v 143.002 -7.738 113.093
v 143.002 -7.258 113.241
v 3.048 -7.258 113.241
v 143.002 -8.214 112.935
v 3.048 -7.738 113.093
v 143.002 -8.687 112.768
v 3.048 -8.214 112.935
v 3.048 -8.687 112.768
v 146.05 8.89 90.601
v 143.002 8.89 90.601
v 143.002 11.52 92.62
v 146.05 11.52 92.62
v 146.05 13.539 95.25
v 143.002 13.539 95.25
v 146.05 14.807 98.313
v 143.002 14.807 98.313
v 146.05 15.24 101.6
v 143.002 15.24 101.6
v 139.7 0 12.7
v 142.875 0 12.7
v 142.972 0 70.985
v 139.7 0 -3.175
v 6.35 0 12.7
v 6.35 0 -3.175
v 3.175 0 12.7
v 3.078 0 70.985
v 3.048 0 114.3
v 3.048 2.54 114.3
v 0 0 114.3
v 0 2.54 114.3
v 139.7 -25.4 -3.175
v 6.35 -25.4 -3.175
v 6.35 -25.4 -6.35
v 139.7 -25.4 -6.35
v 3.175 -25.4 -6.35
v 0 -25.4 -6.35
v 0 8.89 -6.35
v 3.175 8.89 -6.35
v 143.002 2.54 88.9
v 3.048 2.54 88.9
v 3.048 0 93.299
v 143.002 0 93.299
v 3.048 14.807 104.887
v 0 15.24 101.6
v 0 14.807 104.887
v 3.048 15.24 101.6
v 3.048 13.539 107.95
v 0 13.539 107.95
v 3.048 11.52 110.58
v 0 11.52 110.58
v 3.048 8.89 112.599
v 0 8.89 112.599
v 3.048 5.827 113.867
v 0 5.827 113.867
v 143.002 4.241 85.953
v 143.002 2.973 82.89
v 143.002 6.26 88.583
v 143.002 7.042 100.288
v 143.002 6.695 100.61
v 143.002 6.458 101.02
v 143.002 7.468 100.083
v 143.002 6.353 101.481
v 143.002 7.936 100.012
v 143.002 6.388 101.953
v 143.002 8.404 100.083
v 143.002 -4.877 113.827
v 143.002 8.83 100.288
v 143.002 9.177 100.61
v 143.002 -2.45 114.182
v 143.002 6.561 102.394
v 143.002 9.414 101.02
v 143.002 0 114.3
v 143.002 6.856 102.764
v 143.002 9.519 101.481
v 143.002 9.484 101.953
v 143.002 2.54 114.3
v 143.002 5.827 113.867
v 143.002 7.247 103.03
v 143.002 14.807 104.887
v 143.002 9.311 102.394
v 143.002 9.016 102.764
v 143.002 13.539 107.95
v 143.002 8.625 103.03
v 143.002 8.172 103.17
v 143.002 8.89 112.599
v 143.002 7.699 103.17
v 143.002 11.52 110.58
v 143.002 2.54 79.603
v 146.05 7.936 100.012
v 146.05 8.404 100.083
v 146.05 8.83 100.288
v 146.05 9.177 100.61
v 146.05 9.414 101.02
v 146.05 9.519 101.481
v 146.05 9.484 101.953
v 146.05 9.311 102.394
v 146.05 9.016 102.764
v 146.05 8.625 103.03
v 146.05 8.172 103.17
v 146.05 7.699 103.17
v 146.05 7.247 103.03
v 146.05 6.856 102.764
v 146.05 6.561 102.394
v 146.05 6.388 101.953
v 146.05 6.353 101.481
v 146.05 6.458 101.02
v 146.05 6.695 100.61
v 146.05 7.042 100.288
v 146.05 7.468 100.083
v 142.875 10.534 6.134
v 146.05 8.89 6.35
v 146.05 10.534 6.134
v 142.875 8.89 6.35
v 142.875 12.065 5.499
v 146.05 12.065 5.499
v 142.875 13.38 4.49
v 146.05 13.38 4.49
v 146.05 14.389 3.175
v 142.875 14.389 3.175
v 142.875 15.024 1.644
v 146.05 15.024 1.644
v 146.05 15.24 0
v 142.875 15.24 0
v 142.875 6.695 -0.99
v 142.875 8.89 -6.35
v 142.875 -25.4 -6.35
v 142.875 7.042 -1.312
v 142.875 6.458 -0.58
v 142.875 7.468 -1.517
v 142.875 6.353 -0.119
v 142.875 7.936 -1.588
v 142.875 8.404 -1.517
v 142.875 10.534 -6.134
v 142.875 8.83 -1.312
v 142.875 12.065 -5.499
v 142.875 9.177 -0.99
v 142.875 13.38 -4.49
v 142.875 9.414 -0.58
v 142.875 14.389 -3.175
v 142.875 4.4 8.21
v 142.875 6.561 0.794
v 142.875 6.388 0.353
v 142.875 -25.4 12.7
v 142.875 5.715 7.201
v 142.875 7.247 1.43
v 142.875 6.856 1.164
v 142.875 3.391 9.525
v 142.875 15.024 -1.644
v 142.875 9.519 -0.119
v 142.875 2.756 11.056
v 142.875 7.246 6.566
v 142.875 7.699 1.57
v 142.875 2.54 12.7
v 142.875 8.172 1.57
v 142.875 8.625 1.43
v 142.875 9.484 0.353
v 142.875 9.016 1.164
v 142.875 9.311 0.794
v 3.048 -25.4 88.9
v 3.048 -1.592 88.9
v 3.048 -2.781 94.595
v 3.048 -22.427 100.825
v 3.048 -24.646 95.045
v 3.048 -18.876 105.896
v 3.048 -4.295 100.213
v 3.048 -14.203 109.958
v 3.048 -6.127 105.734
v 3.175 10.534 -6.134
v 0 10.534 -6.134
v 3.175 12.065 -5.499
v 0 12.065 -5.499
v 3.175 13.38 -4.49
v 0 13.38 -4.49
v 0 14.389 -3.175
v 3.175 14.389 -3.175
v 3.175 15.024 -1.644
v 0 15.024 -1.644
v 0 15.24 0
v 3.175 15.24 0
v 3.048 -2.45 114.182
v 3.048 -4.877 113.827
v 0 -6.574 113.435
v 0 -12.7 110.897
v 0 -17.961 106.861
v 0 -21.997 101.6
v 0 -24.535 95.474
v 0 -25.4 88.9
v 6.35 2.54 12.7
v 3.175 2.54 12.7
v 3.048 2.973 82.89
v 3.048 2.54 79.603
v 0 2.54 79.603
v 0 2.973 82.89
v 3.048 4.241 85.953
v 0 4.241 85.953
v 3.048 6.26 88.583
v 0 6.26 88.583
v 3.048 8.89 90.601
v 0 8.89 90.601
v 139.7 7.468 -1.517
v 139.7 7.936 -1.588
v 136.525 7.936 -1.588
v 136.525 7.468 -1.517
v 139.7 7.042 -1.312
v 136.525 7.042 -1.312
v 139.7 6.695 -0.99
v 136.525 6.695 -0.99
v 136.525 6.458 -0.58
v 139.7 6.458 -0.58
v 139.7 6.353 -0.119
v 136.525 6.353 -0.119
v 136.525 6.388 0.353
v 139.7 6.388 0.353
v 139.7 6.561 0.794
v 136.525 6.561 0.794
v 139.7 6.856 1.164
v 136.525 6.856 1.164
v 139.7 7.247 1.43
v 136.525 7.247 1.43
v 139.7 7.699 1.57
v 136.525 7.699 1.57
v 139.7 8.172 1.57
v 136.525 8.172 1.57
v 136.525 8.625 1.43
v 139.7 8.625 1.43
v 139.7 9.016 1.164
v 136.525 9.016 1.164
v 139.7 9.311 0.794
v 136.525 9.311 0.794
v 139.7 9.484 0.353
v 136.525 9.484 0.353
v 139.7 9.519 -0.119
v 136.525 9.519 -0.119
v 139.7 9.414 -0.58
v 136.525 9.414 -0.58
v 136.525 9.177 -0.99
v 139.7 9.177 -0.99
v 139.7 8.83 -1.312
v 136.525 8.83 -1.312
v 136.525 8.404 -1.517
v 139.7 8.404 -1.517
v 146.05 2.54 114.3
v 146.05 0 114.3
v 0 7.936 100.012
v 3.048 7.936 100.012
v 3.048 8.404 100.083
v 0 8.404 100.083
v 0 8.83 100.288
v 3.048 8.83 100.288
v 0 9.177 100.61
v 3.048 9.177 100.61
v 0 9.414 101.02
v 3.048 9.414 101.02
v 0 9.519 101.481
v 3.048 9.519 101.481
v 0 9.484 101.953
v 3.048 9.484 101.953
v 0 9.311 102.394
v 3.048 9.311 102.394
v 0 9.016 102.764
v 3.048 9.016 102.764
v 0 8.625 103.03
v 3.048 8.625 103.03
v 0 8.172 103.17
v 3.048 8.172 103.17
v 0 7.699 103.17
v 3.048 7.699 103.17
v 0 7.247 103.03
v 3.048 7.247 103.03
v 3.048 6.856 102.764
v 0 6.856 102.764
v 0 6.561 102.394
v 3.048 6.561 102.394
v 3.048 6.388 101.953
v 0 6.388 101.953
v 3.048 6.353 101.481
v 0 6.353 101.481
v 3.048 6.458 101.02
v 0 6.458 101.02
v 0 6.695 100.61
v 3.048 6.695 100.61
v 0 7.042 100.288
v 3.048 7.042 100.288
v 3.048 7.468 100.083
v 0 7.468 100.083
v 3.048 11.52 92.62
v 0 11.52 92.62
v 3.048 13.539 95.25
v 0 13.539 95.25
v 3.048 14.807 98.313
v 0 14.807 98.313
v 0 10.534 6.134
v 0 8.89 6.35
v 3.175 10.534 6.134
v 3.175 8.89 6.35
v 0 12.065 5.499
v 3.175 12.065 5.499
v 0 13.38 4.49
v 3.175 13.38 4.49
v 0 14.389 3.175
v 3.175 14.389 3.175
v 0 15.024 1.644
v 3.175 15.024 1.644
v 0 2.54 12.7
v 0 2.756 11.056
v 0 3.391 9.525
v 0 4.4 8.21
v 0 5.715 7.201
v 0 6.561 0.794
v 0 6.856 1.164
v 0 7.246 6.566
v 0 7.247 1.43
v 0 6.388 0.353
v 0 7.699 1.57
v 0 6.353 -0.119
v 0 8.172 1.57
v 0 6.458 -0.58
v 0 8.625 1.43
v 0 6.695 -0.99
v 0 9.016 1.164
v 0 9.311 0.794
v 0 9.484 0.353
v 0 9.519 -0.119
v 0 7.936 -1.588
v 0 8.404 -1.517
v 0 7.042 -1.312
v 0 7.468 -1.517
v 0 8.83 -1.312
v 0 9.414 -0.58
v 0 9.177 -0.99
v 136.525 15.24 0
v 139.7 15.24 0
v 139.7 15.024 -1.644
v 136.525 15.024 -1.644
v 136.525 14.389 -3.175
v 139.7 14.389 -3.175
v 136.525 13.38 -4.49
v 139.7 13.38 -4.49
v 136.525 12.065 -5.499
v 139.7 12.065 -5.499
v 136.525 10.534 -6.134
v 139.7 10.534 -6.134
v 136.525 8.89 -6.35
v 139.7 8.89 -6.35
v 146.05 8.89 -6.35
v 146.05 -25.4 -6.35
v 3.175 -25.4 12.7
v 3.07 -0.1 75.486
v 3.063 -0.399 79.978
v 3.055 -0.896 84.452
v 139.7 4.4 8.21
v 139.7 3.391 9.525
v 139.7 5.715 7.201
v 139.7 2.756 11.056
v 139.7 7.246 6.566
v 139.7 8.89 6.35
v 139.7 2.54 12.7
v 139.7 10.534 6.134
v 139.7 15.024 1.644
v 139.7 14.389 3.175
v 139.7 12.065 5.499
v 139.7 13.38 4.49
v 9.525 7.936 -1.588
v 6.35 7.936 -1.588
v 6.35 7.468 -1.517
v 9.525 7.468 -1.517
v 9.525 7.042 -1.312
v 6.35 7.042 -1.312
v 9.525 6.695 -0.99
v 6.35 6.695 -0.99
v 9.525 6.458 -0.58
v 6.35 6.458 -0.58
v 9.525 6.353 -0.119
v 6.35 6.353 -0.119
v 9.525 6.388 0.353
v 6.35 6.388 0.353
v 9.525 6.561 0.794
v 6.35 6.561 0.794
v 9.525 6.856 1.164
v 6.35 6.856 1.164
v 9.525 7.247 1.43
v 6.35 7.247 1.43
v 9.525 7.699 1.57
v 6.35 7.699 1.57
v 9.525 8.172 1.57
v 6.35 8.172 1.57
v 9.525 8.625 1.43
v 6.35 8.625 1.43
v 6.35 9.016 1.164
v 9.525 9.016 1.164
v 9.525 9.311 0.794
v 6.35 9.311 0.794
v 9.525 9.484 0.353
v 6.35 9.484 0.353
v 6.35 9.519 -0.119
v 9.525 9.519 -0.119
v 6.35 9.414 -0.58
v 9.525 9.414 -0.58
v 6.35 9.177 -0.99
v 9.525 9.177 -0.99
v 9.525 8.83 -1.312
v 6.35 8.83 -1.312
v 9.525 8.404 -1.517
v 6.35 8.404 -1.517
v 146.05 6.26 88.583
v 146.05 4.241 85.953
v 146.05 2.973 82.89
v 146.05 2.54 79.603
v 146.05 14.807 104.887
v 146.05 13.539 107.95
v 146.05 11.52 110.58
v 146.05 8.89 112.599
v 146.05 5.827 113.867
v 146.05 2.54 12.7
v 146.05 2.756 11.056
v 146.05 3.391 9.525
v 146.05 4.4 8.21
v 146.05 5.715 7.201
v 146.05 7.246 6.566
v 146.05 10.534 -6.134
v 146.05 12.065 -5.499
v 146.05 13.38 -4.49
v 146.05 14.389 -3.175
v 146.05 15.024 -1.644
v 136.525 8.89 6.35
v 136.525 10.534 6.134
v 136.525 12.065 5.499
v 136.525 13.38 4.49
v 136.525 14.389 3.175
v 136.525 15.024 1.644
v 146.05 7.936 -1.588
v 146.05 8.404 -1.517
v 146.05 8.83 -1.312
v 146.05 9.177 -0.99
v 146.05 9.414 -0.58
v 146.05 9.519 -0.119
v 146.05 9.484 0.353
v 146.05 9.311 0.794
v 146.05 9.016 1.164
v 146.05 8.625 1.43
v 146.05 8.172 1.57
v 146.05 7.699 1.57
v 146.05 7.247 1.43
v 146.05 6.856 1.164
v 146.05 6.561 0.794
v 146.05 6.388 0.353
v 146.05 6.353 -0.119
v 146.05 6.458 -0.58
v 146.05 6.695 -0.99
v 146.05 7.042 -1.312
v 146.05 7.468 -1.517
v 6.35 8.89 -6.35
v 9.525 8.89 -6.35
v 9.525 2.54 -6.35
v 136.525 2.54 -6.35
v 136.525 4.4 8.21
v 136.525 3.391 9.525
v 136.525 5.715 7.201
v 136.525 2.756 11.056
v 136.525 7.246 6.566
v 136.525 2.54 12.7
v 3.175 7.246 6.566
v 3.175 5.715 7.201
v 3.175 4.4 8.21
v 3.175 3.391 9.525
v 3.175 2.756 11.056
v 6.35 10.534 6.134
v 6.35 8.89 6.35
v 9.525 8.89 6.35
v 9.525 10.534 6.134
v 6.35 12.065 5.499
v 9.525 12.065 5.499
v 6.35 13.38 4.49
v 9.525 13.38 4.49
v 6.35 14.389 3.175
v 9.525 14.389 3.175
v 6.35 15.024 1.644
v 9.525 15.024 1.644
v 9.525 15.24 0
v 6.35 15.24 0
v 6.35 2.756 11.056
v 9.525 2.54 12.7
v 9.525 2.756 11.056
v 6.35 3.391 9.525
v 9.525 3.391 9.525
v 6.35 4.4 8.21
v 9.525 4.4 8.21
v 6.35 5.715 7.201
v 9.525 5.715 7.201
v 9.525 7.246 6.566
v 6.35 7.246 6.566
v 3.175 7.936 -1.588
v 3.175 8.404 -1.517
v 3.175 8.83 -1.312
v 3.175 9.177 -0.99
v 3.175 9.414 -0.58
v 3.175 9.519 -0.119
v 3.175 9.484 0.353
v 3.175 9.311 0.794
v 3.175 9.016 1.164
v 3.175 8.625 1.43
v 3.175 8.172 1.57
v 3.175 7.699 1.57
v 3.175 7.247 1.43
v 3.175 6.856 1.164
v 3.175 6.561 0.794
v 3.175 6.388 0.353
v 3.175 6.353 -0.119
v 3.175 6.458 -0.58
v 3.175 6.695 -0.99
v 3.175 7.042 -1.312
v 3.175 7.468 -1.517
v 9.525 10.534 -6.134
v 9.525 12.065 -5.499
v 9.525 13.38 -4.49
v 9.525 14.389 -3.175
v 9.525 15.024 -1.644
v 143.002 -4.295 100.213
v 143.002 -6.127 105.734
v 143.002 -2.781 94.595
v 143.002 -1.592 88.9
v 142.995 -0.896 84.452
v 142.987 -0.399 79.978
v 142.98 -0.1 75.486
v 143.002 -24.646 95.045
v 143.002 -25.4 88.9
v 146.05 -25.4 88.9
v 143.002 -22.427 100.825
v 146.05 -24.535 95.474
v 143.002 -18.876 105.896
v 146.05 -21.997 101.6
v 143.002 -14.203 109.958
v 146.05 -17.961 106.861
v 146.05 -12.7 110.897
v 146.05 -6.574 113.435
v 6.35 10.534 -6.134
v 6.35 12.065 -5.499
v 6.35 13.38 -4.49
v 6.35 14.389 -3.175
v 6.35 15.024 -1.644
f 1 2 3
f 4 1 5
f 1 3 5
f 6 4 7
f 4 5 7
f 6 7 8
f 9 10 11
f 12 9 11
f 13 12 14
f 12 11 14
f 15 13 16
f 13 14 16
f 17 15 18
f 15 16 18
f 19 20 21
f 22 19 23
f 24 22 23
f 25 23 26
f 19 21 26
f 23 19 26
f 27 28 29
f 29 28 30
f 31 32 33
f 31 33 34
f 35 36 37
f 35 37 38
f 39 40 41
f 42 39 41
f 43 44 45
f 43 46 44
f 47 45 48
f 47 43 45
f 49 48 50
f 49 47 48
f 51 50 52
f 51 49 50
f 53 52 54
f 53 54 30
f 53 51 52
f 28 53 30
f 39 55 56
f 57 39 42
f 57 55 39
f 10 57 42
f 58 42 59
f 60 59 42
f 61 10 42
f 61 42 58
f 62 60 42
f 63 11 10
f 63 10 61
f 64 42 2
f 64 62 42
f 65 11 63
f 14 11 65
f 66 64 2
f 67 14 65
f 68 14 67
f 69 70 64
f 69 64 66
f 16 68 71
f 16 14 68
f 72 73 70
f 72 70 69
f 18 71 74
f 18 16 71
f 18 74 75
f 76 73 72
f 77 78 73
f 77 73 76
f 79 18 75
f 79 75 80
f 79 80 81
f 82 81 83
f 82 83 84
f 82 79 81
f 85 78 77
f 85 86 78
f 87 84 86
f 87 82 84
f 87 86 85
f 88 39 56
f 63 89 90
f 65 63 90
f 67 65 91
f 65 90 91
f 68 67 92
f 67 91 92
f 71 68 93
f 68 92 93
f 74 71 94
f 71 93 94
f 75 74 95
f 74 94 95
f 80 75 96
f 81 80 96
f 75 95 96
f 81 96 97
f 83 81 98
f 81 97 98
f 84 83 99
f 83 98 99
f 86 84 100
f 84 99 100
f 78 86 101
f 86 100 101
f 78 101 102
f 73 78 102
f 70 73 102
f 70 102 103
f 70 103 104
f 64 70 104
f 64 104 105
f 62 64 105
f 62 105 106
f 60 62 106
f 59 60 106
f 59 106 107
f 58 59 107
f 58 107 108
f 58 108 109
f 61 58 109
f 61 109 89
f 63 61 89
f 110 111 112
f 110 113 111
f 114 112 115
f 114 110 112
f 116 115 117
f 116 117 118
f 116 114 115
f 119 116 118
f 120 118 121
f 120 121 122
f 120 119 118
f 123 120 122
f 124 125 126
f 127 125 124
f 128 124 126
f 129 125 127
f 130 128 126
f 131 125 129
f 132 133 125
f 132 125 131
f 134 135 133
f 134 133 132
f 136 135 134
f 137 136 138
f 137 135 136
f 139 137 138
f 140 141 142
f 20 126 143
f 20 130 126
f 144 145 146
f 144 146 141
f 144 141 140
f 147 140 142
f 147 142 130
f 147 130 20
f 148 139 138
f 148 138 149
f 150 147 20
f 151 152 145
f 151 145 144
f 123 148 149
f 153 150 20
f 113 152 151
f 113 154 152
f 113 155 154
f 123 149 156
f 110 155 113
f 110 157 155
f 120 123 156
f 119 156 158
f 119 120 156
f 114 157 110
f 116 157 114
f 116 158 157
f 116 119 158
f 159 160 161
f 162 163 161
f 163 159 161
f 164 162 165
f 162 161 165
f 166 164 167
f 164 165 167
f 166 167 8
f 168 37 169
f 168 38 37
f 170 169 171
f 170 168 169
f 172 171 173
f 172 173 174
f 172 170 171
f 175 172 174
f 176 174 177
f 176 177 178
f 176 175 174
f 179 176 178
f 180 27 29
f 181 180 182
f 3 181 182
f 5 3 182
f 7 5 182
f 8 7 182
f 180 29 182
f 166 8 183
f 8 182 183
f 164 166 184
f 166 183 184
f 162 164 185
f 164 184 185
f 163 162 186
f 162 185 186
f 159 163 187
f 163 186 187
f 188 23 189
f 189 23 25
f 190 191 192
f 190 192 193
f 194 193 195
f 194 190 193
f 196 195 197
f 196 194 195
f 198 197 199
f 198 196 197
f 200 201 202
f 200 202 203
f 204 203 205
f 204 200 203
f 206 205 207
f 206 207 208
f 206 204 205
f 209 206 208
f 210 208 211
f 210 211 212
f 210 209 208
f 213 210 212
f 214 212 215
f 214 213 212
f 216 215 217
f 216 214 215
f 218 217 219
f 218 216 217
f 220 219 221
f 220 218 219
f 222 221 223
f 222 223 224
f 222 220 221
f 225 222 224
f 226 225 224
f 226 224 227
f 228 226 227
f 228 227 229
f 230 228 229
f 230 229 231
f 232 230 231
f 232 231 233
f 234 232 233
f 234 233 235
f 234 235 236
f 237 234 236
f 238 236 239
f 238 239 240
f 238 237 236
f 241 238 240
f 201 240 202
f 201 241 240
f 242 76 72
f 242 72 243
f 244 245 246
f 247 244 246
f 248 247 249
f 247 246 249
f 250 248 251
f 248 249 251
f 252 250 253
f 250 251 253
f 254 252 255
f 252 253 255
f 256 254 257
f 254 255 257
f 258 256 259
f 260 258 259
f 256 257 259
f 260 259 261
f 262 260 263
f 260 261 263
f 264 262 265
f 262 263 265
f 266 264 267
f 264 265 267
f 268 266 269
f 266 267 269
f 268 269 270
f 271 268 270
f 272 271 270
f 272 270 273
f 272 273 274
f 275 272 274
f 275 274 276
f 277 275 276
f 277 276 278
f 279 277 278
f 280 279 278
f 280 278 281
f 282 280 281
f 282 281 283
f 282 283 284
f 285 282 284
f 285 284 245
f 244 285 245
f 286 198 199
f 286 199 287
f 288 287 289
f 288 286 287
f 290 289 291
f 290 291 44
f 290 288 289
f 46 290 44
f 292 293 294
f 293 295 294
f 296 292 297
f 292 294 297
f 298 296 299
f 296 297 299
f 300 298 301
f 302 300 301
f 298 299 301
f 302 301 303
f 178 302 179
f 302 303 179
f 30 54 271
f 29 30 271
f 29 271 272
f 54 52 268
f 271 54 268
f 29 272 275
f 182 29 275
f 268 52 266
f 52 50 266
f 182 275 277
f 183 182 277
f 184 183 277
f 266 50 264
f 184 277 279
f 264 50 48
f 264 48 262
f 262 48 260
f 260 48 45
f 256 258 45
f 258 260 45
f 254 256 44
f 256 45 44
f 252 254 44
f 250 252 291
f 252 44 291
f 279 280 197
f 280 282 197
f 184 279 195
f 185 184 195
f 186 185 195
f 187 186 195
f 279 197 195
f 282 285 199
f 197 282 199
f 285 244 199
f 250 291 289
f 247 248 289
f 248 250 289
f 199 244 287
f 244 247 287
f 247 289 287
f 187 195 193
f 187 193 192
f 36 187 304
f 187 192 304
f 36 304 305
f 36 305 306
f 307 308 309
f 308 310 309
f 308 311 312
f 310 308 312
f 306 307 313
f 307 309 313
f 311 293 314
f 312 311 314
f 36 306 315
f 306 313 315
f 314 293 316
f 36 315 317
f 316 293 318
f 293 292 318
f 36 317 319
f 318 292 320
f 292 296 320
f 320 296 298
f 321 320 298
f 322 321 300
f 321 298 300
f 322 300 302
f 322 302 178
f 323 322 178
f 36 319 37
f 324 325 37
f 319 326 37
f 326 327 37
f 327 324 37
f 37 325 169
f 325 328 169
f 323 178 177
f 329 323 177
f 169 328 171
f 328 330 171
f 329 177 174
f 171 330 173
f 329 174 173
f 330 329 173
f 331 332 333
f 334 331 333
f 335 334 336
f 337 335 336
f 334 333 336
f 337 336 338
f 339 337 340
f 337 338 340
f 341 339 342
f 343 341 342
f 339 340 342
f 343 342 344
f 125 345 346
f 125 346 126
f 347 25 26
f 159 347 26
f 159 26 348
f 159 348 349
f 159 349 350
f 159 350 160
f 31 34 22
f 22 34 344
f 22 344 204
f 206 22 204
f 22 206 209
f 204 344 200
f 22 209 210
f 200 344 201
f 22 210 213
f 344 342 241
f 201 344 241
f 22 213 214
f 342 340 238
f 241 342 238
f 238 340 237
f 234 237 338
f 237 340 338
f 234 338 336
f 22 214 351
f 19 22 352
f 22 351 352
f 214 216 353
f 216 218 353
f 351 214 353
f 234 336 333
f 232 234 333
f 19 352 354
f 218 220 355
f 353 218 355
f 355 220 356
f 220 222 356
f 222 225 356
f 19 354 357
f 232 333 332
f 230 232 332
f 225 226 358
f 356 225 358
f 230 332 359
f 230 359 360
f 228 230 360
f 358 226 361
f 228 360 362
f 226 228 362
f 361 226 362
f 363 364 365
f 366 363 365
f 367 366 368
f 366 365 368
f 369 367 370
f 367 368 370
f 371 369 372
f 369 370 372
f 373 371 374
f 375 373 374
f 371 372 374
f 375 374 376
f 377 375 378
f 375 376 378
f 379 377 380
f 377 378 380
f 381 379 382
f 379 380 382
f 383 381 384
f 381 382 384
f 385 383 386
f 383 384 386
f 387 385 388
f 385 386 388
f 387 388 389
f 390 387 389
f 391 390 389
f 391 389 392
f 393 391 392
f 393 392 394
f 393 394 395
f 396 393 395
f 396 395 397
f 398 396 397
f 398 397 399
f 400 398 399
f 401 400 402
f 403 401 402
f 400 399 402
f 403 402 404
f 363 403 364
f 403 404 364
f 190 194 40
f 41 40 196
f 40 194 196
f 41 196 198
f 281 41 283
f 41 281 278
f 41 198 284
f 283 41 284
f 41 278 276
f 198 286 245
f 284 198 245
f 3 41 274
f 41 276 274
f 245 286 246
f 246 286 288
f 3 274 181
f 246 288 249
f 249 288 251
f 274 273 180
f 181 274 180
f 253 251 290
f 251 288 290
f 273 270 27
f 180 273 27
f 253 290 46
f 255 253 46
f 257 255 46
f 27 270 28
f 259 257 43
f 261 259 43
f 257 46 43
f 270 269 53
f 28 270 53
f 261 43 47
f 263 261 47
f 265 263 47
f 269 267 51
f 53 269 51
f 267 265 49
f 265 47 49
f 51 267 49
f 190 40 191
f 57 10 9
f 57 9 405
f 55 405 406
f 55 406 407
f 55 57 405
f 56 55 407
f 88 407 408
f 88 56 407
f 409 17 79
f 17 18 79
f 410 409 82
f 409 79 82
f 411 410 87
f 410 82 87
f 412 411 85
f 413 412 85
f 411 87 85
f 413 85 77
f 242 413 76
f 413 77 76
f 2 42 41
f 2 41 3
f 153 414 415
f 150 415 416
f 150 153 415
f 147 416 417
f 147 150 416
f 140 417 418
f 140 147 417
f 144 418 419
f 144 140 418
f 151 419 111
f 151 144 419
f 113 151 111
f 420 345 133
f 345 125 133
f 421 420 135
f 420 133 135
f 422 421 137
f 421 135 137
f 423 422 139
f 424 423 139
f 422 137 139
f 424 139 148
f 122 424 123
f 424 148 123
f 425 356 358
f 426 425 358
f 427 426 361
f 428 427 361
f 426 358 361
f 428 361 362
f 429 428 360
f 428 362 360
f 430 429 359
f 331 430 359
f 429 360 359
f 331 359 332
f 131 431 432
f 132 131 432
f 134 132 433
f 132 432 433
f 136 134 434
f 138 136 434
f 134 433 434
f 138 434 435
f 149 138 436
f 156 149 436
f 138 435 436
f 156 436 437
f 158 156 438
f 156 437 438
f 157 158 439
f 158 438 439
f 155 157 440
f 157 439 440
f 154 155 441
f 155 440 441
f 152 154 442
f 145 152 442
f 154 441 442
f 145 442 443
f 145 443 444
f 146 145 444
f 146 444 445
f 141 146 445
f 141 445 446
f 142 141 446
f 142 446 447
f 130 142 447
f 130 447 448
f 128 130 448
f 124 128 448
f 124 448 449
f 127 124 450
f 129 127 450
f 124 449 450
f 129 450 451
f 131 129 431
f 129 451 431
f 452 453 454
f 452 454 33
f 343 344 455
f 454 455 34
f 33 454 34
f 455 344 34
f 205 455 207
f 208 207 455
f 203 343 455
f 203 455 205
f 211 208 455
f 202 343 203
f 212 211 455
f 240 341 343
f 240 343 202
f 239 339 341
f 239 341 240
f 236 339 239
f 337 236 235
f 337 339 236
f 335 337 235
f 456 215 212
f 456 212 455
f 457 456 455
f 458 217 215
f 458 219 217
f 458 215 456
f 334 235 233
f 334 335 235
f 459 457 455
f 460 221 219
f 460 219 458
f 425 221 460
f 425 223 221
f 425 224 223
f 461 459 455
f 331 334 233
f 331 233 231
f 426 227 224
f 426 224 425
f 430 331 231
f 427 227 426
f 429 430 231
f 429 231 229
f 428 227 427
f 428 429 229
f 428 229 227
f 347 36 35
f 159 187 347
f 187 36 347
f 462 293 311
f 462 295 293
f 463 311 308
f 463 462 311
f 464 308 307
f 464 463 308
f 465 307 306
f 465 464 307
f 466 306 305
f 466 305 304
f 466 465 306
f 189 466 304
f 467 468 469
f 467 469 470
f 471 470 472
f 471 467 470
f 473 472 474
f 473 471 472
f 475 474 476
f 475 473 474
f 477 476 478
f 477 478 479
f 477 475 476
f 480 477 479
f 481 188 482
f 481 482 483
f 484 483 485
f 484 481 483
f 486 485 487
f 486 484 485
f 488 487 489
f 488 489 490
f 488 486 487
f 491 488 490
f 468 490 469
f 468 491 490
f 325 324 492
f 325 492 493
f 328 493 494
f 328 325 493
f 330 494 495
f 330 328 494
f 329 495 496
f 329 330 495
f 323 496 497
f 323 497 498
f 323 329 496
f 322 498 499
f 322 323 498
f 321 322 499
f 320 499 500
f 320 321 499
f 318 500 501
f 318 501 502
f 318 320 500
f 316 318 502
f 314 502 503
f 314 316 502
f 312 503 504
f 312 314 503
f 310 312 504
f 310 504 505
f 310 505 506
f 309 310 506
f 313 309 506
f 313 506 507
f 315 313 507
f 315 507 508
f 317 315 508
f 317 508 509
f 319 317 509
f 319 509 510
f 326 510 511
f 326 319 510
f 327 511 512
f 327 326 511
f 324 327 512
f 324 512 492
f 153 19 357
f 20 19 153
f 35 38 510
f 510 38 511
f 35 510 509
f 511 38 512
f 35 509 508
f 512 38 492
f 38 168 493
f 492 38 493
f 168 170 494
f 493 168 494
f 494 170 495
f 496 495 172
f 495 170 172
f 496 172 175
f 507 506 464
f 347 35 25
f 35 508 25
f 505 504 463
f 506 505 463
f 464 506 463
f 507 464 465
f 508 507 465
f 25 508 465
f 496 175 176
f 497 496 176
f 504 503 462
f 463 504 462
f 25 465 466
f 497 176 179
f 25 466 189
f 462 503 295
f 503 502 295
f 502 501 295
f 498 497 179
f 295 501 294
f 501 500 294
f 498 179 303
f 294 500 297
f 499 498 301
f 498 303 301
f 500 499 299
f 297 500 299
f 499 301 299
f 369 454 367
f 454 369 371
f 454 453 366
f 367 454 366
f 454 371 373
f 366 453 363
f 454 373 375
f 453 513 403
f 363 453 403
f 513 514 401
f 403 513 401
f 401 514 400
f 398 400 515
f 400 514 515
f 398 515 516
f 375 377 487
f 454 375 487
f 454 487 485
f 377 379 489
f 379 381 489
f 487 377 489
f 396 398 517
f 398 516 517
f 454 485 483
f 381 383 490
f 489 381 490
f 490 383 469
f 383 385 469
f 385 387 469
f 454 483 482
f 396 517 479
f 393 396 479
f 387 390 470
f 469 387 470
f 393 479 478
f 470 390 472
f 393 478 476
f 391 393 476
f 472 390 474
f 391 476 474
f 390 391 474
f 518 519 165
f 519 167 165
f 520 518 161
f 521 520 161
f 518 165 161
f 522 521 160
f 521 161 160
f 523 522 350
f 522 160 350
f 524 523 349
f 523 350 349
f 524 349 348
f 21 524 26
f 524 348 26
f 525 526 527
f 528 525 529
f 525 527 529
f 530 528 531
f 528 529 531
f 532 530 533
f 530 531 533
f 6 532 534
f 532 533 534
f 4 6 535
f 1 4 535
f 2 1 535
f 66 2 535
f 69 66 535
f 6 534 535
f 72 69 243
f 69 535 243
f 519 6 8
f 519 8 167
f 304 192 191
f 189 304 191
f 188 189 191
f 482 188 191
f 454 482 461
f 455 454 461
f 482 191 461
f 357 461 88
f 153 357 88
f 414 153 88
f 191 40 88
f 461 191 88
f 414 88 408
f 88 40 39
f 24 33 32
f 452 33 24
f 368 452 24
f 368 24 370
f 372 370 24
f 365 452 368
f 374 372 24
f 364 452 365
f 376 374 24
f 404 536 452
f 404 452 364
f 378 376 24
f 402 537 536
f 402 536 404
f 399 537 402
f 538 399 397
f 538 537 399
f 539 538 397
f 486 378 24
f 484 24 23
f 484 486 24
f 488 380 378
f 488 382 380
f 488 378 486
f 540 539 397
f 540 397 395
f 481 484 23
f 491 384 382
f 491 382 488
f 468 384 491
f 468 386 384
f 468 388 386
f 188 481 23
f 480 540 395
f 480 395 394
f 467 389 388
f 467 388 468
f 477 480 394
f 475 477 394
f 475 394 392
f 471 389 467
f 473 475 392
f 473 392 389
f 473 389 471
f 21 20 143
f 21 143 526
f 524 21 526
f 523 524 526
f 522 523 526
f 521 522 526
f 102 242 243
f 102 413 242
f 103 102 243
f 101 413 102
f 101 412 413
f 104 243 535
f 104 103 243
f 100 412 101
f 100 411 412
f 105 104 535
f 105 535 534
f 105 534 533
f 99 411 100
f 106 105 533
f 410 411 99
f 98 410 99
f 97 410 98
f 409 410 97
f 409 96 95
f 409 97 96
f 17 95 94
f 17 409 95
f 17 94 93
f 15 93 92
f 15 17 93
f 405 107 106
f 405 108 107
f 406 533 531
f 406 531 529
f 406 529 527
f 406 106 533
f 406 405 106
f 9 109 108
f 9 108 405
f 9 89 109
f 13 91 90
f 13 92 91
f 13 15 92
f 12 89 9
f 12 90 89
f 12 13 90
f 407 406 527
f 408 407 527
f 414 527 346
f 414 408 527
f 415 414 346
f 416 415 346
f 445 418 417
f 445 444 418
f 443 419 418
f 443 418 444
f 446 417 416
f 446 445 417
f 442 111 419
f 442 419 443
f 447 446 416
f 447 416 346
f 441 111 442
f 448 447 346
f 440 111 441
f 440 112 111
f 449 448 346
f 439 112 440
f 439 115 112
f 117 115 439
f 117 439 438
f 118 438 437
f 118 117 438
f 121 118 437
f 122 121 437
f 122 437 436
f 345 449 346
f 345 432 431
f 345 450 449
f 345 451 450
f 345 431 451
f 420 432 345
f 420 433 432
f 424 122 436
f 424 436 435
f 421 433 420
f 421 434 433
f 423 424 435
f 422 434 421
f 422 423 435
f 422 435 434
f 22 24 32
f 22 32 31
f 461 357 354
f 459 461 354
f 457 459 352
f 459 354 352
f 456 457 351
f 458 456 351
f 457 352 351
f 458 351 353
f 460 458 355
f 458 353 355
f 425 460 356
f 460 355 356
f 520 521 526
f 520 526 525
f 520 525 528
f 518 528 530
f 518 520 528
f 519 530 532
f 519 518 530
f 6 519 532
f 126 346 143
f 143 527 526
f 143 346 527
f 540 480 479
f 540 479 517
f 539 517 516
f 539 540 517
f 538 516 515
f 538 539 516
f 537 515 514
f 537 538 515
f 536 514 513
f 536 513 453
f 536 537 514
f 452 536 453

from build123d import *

# Parameters (mm, degrees)
BOSS_EXTRUDE1_DEPTH  = 2.54
SKETCH2_W            = 3.048
SKETCH2_H            = 25.4
BOSS_EXTRUDE2_DEPTH  = 12.7
FILLET5_R            = 12.7
FILLET6_R            = 12.7
FILLET7_R            = 12.7
FILLET8_R            = 12.7
SKETCH3_R            = 1.5875
CUT_EXTRUDE1_DEPTH   = 187.084255379
SKETCH4_W            = 12.7
SKETCH4_H            = 12.7
SKETCH4_R            = 1.5875
BOSS_EXTRUDE3_DEPTH  = 3.175
BOSS_EXTRUDE4_DEPTH  = 6.35
FILLET10_R           = 6.35
FILLET11_R           = 6.35
SKETCH6_W            = 3.175
SKETCH6_H            = 19.05
CUT_EXTRUDE2_DEPTH   = 3.175
BOSS_EXTRUDE5_DEPTH  = 25.4
FILLET12_R           = 25.4
SKETCH8_W            = 133.35
SKETCH8_H            = 3.175
BOSS_EXTRUDE6_DEPTH  = 25.4
BOSS_EXTRUDE9_DEPTH  = 114.554
CUT_EXTRUDE3_REACH   = 177.181
BOSS_EXTRUDE10_DEPTH = 12.7
BOSS_EXTRUDE11_DEPTH = 12.7
CUT_EXTRUDE4_DEPTH   = 185.822136131
FILLET15_R           = 101.6
SKETCH14_R           = 1.5875
BOSS_EXTRUDE12_DEPTH = 3.175


# Some blends are built 0.0001 mm under size
with BuildPart() as part:
    # Sketch1 → Boss-Extrude1 (new body)
    with BuildSketch(Plane(origin=(0, 0, 0), x_dir=(1, 0, 0), z_dir=(0, 1, 0))):
        Polygon((15.748, -114.3), (130.302, -114.3), (130.302, -88.9), (143.002, -88.9), (143.002, -114.3), (146.05, -114.3), (146.05, 0), (0, 0), (0, -114.3), (3.048, -114.3), (3.048, -88.9), (15.748, -88.9), align=None)
    extrude(amount=BOSS_EXTRUDE1_DEPTH)

    # Sketch2 → Boss-Extrude2 (add)
    with BuildSketch(Plane(origin=(0, 2.54, 0), x_dir=(1, 0, 0), z_dir=(0, 1, 0))):
        with Locations((1.524, -101.6)):
            Rectangle(SKETCH2_W, SKETCH2_H)
    boss_extrude2 = extrude(amount=BOSS_EXTRUDE2_DEPTH)

    # Mirror1: Boss-Extrude2 across plane
    add(boss_extrude2.mirror(Plane(origin=(73.025, 0, 0), x_dir=(0, 0, 1), z_dir=(1, 0, 0))))

    # Fillet5
    fillet5_edges = [part.edges().sort_by_distance(p)[0] for p in [
        (1.524, 15.24, 114.3),
        (1.524, 15.24, 88.9),
    ]]
    fillet(fillet5_edges, radius=FILLET5_R - 0.0001)  # a hair under: the kernel refuses the full size

    # Fillet6
    # the kernel refuses this fillet: 12.7 mm, written as the material it adds along each edge
    with BuildSketch(Plane(origin=(3.048, 2.54, 88.9), x_dir=(0, 0.9659271393953295, 0.25881414447351125), z_dir=(-1, 0, 0))) as fillet6_piece_1:
        with BuildLine():
            CenterArc((9.861056917, 12.267248789), FILLET6_R, 194.99970931, 60.000130236)
            Line((-2.406217753, 8.980309154), (-3.63294522, 8.65161519))
            Line((-3.63294522, 8.65161519), (-1.226727467, -0.328693963))
            Line((-1.226727467, -0.328693963), (0.328693963, -1.226727467))
            ThreePointArc((0.328693963, -1.226727467), (0.328790556, -1.226701586), (6.245317068, -1.226724879))
            Line((6.245317068, -1.226724879), (6.574020691, 0))
        make_face()
    extrude(amount=3.048)

    # Fillet7
    fillet7_edges = [part.edges().sort_by_distance(p)[0] for p in [
        (144.526, 15.24, 88.9),
        (144.526, 15.24, 114.3),
    ]]
    fillet(fillet7_edges, radius=FILLET7_R - 0.0001)  # a hair under: the kernel refuses the full size

    # Fillet8
    # the kernel refuses this fillet: 12.7 mm, written as the material it adds along each edge
    with BuildSketch(Plane(origin=(143.002, 2.54, 88.9), x_dir=(0, 0, -1), z_dir=(1, 0, 0))) as fillet8_piece_1:
        with BuildLine():
            CenterArc((9.297087521, 12.7), FILLET8_R, 209.999869764, 60.000130236)
            Line((-1.701449541, 6.350025), (-2.801303247, 5.7150275))
            ThreePointArc((-2.801303247, 5.7150275), (-1.27, 0.0001), (-1.27, 0))
            Line((-1.27, 0), (0, -1.27))
            Line((0, -1.27), (9.297087521, -1.27))
            Line((9.297087521, -1.27), (9.297087521, 0))
        make_face()
    extrude(amount=3.048)

    # Sketch3 → Cut-Extrude1 (cut, through all)
    with BuildSketch(Plane(origin=(146.05, 0, 0), x_dir=(0, 0, -1), z_dir=(1, 0, 0))):
        with Locations((-101.6, 7.935875783)):
            Circle(SKETCH3_R)
    extrude(amount=-CUT_EXTRUDE1_DEPTH, mode=Mode.SUBTRACT)

    # Sketch4 → Boss-Extrude3 (add)
    with BuildSketch(Plane(origin=(146.05, 0, 0), x_dir=(0, 0, -1), z_dir=(1, 0, 0))):
        with Locations((0, 8.89)):
            Rectangle(SKETCH4_W, SKETCH4_H)
        with Locations((0, 7.935875783)):
            Circle(SKETCH4_R, mode=Mode.SUBTRACT)
    boss_extrude3 = extrude(amount=-BOSS_EXTRUDE3_DEPTH)

    # Sketch5 → Boss-Extrude4 (add)
    with BuildSketch(Plane(origin=(0, 0, 0), x_dir=(-1, 0, 0), z_dir=(0, 0, -1))):
        Polygon((-146.05, 0), (0, 0), (0, 2.54), (-142.875, 2.54), (-146.05, 2.54), align=None)
    extrude(amount=BOSS_EXTRUDE4_DEPTH)

    # Mirror2: Boss-Extrude3 across plane
    add(boss_extrude3.mirror(Plane(origin=(73.025, 0, 0), x_dir=(0, 0, 1), z_dir=(1, 0, 0))))

    # Fillet10
    fillet10_edges = [part.edges().sort_by_distance(p)[0] for p in [
        (1.5875, 15.24, 6.35),
        (1.5875, 15.24, -6.35),
        (144.4625, 15.24, -6.35),
        (144.4625, 15.24, 6.35),
    ]]
    fillet(fillet10_edges, radius=FILLET10_R - 0.0001)  # a hair under: the kernel refuses the full size

    # Fillet11
    fillet11_edges = [part.edges().sort_by_distance(p)[0] for p in [
        (1.5875, 2.54, 6.35),
        (144.4625, 2.54, 6.35),
    ]]
    fillet(fillet11_edges, radius=FILLET11_R)

    # Sketch6 → Cut-Extrude2 (cut)
    with BuildSketch(Plane.XZ):
        with Locations((141.2875, 3.175)):
            Rectangle(SKETCH6_W, SKETCH6_H)
    cut_extrude2 = extrude(amount=-CUT_EXTRUDE2_DEPTH, mode=Mode.SUBTRACT)

    # Mirror3: Cut-Extrude2 across plane
    add(cut_extrude2.mirror(Plane(origin=(73.025, 0, 0), x_dir=(0, 0, 1), z_dir=(1, 0, 0))), mode=Mode.SUBTRACT)

    # Sketch7 → Boss-Extrude5 (add)
    with BuildSketch(Plane.XZ):
        Polygon((143.002, 114.3), (146.05, 114.3), (146.05, -6.35), (142.875, -6.35), (142.875, 12.7), (143.002, 88.9), align=None)
    boss_extrude5 = extrude(amount=BOSS_EXTRUDE5_DEPTH)

    # Mirror4: Boss-Extrude5 across plane
    add(boss_extrude5.mirror(Plane(origin=(73.025, 0, 0), x_dir=(0, 0, 1), z_dir=(1, 0, 0))))

    # Fillet12
    fillet12_edges = [part.edges().sort_by_distance(p)[0] for p in [
        (1.524, -25.4, 114.3),
        (144.526, -25.4, 114.3),
    ]]
    fillet(fillet12_edges, radius=FILLET12_R)

    # Sketch8 → Boss-Extrude6 (add)
    with BuildSketch(Plane.XZ):
        with Locations((73.025, -4.7625)):
            Rectangle(SKETCH8_W, SKETCH8_H)
    extrude(amount=BOSS_EXTRUDE6_DEPTH)

    # Sketch9 → Boss-Extrude9 (add)
    with BuildSketch(Plane.ZY.offset(-15.748)):
        Polygon((114.3, -9.24484395), (114.3, -7.643590007), (93.299409051, 0), (88.9, 0), align=None)
    extrude(amount=-BOSS_EXTRUDE9_DEPTH)

    # Sketch10 → Cut-Extrude3 (cut, up to next)
    with BuildSketch(Plane.ZY.offset(-15.748), mode=Mode.PRIVATE) as cut_extrude3_sk1:
        Polygon((93.299409051, 0), (88.9, 2.54), (114.3, 2.54), (114.3, 0), align=None)
    cut_extrude3_tool1 = extrude(cut_extrude3_sk1.sketch, amount=-CUT_EXTRUDE3_REACH, mode=Mode.PRIVATE) & part.part
    add(cut_extrude3_tool1.solids().sort_by_distance((15.748, 1.310138, 102.665092))[0], mode=Mode.SUBTRACT)

    # Sketch11 → Boss-Extrude10 (add)
    with BuildSketch(Plane.ZY.offset(-15.748)):
        Polygon((114.3, -7.643590007), (93.299409051, 0), (88.9, 2.54), (88.9, 0), (114.3, -9.24484395), align=None)
    extrude(amount=BOSS_EXTRUDE10_DEPTH)

    # Sketch12 → Boss-Extrude11 (add)
    with BuildSketch(Plane(origin=(130.302, 0, 0), x_dir=(0, 0, -1), z_dir=(1, 0, 0))):
        Polygon((-88.9, 0), (-88.9, 2.54), (-93.299409051, 0), (-114.3, -7.643590007), (-114.3, -9.24484395), align=None)
    extrude(amount=BOSS_EXTRUDE11_DEPTH)

    # Sketch13 → Cut-Extrude4 (cut, through all)
    with BuildSketch(Plane.ZY.offset(-3.048)):
        with BuildLine():
            Line((114.3, -7.643590007), (113.240908135, -7.258112093))
            ThreePointArc((113.240908135, -7.258112093), (113.015140482, -7.976214611), (112.768192568, -8.68731164))
            Line((112.768192568, -8.68731164), (114.3, -9.24484395))
            Line((114.3, -9.24484395), (114.3, -7.643590007))
        make_face()
    extrude(amount=-CUT_EXTRUDE4_DEPTH, mode=Mode.SUBTRACT)

    # Fillet15
    fillet15_edges = [part.edges().sort_by_distance(p)[0] for p in [
        (73.025, 0, 88.9),
    ]]
    fillet(fillet15_edges, radius=FILLET15_R)

    # Sketch14 → Boss-Extrude12 (add)
    with BuildSketch(Plane.ZY.offset(-6.35)):
        with BuildLine():
            Line((-6.35, 2.54), (12.7, 2.54))
            ThreePointArc((12.7, 2.54), (8.209871939, 4.399871939), (6.35, 8.89))
            ThreePointArc((6.35, 8.89), (4.490128061, 13.380128061), (0, 15.24))
            ThreePointArc((0, 15.24), (-4.490128061, 13.380128061), (-6.35, 8.89))
            Line((-6.35, 8.89), (-6.35, 2.54))
        make_face()
        with Locations(Location((0, 7.935875783, 0), (0, 0, 180))):
            Circle(SKETCH14_R, mode=Mode.SUBTRACT)
    boss_extrude12 = extrude(amount=-BOSS_EXTRUDE12_DEPTH)

    # Mirror5: Boss-Extrude12 across plane
    add(boss_extrude12.mirror(Plane(origin=(73.025, 0, 0), x_dir=(0, 0, 1), z_dir=(1, 0, 0))))


solid = part.part
